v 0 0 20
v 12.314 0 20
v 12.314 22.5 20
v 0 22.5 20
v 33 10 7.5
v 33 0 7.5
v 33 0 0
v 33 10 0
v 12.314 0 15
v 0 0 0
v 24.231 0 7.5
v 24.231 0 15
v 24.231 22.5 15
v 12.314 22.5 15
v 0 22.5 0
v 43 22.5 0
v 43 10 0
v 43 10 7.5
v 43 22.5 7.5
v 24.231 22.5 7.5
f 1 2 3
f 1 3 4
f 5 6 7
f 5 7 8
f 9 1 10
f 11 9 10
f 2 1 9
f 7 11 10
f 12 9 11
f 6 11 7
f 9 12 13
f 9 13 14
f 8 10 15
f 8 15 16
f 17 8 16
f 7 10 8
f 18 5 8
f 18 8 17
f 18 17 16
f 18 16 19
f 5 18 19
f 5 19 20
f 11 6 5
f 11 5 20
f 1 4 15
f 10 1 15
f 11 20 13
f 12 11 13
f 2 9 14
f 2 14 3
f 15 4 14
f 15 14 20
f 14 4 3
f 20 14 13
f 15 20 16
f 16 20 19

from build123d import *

# Parameters (mm, degrees)
F1_DEPTH = 22.5
F2_W     = 10
F2_H     = 10
F3_DEPTH = 25


with BuildPart() as f1:
    # F0 (on Front) → F1 (new body)
    with BuildSketch(Plane.XZ):
        Polygon((0, 20), (0, 0), (43, 0), (43, 7.5), (24.230773, 7.5), (24.230773, 15), (12.313999, 15), (12.313999, 20), align=None)
    extrude(amount=-F1_DEPTH)

    # F2 (on face) → F3 (cut)
    with BuildSketch(Plane.XY.offset(7.5)):
        with Locations((38, 5)):
            Rectangle(F2_W, F2_H)
    extrude(amount=-F3_DEPTH, mode=Mode.SUBTRACT)


solid = f1.part
